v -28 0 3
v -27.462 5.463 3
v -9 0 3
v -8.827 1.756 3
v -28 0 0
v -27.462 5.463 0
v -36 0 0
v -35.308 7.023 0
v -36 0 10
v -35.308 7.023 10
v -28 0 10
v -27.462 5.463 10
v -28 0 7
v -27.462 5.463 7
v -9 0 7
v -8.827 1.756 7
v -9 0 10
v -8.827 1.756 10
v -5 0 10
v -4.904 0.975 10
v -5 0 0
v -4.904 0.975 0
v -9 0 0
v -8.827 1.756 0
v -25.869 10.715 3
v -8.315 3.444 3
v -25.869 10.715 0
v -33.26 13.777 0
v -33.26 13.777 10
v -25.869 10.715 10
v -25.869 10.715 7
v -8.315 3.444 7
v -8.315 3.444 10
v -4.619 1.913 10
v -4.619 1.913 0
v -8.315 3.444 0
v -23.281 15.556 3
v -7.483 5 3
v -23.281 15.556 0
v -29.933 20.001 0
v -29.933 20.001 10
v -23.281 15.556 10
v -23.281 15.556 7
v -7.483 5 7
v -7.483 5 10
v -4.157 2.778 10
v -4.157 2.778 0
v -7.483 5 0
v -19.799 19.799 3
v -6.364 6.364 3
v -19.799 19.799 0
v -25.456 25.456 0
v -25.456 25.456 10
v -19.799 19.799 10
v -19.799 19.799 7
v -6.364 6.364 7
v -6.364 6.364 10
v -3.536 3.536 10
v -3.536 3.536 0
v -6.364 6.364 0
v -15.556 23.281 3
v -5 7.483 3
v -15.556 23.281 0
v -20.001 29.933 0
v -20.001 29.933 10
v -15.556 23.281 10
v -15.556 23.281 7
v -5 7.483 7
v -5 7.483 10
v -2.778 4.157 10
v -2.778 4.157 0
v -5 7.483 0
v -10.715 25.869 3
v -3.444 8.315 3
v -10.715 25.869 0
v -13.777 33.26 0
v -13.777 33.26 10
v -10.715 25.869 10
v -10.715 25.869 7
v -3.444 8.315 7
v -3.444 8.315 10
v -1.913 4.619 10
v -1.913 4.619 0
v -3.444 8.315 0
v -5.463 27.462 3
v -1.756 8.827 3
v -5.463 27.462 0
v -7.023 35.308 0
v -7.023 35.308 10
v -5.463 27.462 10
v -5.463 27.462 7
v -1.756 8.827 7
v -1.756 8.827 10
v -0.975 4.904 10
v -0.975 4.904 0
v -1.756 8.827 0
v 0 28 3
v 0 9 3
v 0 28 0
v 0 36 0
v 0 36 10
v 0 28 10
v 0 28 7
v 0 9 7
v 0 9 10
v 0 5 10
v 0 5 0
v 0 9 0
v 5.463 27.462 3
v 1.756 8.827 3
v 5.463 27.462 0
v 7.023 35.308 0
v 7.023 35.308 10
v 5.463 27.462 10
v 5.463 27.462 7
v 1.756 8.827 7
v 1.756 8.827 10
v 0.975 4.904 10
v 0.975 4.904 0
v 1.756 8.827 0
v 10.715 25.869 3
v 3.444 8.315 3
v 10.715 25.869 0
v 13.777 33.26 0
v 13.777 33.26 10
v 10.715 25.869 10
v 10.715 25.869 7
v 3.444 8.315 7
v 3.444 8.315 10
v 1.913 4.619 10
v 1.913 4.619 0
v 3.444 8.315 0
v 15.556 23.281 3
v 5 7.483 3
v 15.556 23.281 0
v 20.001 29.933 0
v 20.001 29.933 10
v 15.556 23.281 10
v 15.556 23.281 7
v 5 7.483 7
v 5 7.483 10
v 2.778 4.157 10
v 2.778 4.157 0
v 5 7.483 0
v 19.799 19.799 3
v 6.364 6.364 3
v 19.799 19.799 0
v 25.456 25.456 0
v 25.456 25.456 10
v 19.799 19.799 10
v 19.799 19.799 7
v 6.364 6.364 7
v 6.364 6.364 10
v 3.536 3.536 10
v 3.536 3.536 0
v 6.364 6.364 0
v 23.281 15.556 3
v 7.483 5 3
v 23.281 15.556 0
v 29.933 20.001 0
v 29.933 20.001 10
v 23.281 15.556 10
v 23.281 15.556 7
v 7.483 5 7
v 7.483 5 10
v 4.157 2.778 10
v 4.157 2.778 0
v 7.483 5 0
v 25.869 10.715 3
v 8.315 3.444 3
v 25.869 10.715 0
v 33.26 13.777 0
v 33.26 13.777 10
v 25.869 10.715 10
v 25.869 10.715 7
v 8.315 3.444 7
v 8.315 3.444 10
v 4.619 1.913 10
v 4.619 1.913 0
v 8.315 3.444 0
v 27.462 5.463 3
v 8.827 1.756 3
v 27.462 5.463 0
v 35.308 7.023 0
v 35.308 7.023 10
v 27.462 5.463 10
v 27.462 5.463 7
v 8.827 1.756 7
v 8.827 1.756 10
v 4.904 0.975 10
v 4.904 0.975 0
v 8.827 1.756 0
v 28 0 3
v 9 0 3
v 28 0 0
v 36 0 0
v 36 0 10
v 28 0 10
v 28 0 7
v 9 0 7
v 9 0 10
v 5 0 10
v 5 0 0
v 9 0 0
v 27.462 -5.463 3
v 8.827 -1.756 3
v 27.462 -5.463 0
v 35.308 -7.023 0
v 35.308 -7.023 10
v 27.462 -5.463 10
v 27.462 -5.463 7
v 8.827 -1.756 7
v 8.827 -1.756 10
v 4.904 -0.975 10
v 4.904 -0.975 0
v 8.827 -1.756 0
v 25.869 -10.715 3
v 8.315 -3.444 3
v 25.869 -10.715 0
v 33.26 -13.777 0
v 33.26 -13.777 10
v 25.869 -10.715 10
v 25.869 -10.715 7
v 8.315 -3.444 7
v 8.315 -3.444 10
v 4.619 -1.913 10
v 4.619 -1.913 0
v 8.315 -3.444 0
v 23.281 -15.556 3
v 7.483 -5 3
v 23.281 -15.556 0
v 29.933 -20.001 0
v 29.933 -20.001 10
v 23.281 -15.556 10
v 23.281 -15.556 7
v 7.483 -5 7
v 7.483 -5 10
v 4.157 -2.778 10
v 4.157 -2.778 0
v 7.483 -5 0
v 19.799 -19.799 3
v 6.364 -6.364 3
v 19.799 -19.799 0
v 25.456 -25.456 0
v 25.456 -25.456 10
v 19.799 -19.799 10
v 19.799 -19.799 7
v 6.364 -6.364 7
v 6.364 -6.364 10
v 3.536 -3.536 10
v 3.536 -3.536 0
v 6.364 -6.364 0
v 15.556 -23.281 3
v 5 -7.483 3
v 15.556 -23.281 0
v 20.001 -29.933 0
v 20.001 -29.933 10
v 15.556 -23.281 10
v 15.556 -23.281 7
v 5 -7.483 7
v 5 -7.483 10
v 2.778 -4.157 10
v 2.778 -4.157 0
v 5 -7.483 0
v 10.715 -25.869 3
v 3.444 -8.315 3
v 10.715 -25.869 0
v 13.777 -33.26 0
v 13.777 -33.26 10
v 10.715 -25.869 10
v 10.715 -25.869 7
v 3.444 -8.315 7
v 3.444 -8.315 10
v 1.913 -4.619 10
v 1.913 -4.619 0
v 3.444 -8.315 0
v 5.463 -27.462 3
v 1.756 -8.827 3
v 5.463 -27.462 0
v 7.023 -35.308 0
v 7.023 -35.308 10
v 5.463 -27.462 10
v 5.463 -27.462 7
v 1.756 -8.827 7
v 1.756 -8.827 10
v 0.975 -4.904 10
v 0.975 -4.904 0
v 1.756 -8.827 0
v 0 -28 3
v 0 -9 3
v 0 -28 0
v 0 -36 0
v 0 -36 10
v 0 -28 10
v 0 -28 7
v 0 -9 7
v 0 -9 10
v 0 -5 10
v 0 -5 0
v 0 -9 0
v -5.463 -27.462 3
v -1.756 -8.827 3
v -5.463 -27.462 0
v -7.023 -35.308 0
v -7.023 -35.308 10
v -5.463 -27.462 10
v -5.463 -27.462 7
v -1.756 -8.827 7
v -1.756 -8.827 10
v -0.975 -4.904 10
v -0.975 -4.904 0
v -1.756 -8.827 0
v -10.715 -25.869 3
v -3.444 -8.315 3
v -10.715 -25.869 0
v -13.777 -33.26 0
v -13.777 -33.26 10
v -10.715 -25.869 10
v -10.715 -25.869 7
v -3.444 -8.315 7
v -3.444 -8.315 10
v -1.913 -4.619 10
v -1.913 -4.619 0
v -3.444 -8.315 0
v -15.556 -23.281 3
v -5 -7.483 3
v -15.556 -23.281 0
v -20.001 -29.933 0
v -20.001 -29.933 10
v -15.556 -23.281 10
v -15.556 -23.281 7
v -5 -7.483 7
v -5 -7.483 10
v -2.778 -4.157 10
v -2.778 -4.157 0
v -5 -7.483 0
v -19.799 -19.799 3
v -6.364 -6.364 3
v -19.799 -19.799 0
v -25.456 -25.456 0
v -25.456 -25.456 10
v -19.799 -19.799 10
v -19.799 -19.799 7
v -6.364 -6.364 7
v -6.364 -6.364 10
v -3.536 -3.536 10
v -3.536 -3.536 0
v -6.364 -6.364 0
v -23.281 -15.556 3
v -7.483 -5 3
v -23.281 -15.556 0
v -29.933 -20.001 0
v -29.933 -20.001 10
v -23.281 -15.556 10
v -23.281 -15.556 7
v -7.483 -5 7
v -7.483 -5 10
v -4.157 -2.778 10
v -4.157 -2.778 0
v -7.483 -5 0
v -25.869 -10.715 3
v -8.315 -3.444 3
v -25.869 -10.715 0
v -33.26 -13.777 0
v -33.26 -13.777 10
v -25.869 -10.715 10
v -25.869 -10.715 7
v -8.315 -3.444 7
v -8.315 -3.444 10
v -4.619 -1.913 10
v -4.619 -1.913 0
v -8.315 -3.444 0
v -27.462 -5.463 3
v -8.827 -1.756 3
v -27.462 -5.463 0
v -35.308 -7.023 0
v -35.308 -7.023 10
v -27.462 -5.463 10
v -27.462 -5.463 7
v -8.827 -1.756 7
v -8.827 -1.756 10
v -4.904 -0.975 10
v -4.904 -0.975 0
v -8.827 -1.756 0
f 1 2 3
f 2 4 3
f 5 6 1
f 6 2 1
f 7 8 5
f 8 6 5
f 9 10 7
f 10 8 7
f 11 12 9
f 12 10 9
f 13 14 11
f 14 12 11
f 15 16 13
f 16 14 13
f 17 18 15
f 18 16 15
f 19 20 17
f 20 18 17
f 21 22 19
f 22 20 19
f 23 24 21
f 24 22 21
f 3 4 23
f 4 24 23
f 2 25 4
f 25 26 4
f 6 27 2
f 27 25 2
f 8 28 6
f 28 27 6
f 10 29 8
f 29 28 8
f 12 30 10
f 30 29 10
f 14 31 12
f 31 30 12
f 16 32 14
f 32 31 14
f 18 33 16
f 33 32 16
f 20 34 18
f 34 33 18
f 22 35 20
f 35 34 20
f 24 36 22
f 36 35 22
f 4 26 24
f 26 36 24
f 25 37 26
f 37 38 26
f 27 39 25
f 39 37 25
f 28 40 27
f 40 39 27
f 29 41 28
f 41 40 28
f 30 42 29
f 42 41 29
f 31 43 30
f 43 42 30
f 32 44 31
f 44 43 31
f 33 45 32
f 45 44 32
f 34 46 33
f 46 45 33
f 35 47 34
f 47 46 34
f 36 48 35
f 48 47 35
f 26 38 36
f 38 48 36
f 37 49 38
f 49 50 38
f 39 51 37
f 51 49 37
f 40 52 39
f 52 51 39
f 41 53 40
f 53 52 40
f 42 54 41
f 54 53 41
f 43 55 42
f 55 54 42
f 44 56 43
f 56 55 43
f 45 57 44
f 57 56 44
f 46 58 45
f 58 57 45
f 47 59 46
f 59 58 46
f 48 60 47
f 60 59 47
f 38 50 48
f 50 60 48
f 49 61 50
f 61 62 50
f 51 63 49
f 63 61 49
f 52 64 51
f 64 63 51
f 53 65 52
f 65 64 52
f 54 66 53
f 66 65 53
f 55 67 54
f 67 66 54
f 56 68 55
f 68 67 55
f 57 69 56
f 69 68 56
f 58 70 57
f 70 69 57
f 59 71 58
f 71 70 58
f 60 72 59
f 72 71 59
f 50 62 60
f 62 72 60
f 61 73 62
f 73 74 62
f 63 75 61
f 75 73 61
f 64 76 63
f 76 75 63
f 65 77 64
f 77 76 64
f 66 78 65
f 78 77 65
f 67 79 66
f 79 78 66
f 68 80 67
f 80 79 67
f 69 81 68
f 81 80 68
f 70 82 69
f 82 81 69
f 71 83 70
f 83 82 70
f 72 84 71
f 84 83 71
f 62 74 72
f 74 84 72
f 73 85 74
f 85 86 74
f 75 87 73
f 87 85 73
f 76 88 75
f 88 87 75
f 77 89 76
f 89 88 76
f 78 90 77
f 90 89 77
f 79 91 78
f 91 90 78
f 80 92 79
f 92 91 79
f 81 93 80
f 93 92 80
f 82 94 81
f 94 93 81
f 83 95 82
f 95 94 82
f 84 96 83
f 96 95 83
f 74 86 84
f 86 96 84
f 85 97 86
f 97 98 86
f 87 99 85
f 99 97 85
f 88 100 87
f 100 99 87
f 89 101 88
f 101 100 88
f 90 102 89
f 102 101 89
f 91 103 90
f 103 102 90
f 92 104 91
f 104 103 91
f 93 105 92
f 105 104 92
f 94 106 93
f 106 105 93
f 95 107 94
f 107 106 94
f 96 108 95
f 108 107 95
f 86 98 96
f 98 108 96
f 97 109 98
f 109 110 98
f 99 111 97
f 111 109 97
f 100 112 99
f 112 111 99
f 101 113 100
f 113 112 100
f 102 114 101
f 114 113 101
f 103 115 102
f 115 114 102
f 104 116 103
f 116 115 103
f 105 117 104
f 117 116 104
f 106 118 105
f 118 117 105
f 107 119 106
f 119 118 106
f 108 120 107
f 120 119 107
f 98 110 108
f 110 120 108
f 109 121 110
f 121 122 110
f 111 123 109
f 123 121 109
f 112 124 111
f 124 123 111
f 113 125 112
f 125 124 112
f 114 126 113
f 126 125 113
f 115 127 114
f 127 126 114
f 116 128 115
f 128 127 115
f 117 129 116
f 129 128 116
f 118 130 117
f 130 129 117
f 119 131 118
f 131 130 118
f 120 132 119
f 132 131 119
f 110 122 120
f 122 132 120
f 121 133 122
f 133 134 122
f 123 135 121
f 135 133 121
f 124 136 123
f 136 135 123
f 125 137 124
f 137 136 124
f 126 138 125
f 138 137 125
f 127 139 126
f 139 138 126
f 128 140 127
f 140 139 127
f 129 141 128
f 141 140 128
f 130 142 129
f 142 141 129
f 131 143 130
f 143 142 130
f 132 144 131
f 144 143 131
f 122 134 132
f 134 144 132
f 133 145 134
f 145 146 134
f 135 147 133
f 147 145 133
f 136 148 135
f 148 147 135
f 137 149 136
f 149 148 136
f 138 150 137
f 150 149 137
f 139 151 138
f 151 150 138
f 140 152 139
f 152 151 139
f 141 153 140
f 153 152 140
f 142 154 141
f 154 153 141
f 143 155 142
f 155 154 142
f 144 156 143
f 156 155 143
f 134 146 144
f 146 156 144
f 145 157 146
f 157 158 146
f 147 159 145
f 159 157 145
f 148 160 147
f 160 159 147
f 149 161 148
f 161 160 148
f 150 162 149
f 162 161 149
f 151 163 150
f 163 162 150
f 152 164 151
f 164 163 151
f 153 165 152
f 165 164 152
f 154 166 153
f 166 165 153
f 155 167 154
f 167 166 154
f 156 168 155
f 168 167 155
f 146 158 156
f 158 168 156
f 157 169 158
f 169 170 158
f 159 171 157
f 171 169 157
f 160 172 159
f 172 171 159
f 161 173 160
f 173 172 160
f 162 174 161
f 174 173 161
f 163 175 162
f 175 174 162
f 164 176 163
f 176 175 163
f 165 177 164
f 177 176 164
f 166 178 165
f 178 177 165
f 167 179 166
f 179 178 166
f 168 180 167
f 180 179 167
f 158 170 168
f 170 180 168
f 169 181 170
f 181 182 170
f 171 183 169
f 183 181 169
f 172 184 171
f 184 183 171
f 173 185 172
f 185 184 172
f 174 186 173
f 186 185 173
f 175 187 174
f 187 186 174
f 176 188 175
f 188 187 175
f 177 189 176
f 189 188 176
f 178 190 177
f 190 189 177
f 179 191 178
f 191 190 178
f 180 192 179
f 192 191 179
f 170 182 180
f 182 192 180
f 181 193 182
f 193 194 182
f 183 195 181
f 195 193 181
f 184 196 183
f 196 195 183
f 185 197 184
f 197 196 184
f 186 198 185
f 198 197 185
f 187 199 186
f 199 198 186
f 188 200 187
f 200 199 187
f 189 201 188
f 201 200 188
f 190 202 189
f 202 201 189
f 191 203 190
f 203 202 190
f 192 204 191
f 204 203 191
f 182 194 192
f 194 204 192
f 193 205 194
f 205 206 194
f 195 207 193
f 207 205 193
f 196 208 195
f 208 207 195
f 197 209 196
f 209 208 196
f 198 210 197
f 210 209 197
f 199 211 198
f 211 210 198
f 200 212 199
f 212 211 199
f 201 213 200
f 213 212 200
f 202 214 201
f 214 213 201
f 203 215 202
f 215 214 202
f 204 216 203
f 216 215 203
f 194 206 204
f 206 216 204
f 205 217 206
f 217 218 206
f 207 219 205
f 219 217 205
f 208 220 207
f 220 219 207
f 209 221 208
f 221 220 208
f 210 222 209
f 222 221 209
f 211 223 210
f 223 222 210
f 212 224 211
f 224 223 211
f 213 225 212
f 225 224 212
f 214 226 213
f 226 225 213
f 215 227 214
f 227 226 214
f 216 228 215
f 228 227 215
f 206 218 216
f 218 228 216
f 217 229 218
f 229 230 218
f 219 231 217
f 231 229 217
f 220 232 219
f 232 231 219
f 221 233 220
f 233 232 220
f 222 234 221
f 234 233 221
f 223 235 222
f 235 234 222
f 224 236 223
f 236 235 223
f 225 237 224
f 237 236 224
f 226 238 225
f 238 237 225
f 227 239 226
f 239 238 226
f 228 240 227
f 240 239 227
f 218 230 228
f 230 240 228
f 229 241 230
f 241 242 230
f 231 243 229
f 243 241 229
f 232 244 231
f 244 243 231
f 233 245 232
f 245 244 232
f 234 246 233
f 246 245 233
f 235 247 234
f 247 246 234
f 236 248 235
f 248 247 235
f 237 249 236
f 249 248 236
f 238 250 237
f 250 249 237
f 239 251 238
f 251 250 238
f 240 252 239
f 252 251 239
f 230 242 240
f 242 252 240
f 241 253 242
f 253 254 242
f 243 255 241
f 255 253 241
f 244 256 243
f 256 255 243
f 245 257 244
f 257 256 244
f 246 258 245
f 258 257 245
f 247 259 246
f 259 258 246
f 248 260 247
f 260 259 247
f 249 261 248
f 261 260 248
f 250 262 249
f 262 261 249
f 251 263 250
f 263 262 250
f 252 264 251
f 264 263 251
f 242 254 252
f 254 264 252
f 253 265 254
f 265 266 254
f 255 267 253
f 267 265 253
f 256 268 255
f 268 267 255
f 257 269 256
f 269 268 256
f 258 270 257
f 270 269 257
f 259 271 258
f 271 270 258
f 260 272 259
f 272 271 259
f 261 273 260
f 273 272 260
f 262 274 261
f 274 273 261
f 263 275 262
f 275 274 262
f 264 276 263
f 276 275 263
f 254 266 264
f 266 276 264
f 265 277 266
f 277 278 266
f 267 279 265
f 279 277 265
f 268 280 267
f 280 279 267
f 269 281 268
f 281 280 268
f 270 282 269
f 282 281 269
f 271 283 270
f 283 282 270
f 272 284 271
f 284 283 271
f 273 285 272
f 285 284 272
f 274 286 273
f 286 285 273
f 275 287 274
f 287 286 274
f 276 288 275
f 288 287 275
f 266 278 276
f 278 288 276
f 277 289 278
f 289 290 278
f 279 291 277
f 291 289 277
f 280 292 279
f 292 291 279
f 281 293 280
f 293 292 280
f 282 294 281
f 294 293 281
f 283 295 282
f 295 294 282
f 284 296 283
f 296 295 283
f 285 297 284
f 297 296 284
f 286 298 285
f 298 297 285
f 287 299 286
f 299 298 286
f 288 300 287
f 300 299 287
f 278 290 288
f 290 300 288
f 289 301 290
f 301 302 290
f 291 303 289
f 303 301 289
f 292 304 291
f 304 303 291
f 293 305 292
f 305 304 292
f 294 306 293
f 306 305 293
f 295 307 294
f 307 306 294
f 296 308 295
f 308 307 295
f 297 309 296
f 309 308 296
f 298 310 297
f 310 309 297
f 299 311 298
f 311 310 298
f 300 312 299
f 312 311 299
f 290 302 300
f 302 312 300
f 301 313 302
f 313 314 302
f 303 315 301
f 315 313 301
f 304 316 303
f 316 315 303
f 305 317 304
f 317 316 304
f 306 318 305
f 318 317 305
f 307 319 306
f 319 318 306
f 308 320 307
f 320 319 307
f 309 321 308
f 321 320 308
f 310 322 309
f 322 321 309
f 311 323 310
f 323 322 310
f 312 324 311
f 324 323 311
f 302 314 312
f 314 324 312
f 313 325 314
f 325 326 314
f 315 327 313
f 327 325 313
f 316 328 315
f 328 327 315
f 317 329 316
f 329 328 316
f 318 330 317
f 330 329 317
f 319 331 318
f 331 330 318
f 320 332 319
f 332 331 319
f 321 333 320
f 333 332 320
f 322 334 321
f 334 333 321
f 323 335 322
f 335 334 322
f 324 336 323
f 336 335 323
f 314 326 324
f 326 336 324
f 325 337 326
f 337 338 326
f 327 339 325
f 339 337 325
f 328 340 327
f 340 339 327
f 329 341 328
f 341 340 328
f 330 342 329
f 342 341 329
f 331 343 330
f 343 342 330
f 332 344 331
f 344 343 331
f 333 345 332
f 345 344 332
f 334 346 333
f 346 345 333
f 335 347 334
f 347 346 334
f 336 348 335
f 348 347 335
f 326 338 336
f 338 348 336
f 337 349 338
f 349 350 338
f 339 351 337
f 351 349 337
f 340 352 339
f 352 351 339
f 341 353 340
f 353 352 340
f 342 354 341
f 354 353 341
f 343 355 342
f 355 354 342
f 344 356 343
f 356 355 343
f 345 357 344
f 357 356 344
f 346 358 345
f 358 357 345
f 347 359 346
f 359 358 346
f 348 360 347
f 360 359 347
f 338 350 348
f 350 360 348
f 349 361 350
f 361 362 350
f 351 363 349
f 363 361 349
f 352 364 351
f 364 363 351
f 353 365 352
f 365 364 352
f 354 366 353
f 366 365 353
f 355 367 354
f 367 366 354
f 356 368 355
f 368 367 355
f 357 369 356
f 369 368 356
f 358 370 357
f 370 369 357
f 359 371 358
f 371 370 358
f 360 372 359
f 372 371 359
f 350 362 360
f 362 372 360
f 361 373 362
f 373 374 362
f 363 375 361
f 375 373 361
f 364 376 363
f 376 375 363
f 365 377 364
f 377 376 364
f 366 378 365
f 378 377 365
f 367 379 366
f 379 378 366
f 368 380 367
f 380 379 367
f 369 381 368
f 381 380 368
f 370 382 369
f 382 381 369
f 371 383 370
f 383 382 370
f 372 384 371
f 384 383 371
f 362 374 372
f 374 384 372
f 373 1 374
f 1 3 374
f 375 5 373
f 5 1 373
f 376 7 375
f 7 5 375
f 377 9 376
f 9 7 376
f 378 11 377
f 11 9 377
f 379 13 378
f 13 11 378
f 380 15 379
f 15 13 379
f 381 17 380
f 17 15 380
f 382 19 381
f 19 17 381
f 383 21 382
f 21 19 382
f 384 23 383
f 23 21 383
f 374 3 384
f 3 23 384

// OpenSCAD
$fn = 32;

// ----------------------------------------------------------------------
// Revolved part: handwheel R36
// ----------------------------------------------------------------------

// --- parameters (mm) ---
bore_r = 5;               // bore radius
rim_r = 36;               // rim radius
rim_w = 8;                // rim axial width
rim_t = 10;               // rim diameter height
hub_r = 9;                // hub radius
web_t = 4;                // web thickness
revolve_angle = 360;      // revolve sweep, degrees

bore_d = 2 * bore_r;
rim_d = 2 * rim_r;
hub_d = 2 * hub_r;

profile = [[5, 0], [9, 0], [9, 3], [28, 3], [28, 0], [36, 0], [36, 10], [28, 10], [28, 7], [9, 7], [9, 10], [5, 10]];  // primary outline, 12 points, counter clockwise

// --- the one profile operation ---
rotate_extrude(angle = revolve_angle) polygon(points = profile);
